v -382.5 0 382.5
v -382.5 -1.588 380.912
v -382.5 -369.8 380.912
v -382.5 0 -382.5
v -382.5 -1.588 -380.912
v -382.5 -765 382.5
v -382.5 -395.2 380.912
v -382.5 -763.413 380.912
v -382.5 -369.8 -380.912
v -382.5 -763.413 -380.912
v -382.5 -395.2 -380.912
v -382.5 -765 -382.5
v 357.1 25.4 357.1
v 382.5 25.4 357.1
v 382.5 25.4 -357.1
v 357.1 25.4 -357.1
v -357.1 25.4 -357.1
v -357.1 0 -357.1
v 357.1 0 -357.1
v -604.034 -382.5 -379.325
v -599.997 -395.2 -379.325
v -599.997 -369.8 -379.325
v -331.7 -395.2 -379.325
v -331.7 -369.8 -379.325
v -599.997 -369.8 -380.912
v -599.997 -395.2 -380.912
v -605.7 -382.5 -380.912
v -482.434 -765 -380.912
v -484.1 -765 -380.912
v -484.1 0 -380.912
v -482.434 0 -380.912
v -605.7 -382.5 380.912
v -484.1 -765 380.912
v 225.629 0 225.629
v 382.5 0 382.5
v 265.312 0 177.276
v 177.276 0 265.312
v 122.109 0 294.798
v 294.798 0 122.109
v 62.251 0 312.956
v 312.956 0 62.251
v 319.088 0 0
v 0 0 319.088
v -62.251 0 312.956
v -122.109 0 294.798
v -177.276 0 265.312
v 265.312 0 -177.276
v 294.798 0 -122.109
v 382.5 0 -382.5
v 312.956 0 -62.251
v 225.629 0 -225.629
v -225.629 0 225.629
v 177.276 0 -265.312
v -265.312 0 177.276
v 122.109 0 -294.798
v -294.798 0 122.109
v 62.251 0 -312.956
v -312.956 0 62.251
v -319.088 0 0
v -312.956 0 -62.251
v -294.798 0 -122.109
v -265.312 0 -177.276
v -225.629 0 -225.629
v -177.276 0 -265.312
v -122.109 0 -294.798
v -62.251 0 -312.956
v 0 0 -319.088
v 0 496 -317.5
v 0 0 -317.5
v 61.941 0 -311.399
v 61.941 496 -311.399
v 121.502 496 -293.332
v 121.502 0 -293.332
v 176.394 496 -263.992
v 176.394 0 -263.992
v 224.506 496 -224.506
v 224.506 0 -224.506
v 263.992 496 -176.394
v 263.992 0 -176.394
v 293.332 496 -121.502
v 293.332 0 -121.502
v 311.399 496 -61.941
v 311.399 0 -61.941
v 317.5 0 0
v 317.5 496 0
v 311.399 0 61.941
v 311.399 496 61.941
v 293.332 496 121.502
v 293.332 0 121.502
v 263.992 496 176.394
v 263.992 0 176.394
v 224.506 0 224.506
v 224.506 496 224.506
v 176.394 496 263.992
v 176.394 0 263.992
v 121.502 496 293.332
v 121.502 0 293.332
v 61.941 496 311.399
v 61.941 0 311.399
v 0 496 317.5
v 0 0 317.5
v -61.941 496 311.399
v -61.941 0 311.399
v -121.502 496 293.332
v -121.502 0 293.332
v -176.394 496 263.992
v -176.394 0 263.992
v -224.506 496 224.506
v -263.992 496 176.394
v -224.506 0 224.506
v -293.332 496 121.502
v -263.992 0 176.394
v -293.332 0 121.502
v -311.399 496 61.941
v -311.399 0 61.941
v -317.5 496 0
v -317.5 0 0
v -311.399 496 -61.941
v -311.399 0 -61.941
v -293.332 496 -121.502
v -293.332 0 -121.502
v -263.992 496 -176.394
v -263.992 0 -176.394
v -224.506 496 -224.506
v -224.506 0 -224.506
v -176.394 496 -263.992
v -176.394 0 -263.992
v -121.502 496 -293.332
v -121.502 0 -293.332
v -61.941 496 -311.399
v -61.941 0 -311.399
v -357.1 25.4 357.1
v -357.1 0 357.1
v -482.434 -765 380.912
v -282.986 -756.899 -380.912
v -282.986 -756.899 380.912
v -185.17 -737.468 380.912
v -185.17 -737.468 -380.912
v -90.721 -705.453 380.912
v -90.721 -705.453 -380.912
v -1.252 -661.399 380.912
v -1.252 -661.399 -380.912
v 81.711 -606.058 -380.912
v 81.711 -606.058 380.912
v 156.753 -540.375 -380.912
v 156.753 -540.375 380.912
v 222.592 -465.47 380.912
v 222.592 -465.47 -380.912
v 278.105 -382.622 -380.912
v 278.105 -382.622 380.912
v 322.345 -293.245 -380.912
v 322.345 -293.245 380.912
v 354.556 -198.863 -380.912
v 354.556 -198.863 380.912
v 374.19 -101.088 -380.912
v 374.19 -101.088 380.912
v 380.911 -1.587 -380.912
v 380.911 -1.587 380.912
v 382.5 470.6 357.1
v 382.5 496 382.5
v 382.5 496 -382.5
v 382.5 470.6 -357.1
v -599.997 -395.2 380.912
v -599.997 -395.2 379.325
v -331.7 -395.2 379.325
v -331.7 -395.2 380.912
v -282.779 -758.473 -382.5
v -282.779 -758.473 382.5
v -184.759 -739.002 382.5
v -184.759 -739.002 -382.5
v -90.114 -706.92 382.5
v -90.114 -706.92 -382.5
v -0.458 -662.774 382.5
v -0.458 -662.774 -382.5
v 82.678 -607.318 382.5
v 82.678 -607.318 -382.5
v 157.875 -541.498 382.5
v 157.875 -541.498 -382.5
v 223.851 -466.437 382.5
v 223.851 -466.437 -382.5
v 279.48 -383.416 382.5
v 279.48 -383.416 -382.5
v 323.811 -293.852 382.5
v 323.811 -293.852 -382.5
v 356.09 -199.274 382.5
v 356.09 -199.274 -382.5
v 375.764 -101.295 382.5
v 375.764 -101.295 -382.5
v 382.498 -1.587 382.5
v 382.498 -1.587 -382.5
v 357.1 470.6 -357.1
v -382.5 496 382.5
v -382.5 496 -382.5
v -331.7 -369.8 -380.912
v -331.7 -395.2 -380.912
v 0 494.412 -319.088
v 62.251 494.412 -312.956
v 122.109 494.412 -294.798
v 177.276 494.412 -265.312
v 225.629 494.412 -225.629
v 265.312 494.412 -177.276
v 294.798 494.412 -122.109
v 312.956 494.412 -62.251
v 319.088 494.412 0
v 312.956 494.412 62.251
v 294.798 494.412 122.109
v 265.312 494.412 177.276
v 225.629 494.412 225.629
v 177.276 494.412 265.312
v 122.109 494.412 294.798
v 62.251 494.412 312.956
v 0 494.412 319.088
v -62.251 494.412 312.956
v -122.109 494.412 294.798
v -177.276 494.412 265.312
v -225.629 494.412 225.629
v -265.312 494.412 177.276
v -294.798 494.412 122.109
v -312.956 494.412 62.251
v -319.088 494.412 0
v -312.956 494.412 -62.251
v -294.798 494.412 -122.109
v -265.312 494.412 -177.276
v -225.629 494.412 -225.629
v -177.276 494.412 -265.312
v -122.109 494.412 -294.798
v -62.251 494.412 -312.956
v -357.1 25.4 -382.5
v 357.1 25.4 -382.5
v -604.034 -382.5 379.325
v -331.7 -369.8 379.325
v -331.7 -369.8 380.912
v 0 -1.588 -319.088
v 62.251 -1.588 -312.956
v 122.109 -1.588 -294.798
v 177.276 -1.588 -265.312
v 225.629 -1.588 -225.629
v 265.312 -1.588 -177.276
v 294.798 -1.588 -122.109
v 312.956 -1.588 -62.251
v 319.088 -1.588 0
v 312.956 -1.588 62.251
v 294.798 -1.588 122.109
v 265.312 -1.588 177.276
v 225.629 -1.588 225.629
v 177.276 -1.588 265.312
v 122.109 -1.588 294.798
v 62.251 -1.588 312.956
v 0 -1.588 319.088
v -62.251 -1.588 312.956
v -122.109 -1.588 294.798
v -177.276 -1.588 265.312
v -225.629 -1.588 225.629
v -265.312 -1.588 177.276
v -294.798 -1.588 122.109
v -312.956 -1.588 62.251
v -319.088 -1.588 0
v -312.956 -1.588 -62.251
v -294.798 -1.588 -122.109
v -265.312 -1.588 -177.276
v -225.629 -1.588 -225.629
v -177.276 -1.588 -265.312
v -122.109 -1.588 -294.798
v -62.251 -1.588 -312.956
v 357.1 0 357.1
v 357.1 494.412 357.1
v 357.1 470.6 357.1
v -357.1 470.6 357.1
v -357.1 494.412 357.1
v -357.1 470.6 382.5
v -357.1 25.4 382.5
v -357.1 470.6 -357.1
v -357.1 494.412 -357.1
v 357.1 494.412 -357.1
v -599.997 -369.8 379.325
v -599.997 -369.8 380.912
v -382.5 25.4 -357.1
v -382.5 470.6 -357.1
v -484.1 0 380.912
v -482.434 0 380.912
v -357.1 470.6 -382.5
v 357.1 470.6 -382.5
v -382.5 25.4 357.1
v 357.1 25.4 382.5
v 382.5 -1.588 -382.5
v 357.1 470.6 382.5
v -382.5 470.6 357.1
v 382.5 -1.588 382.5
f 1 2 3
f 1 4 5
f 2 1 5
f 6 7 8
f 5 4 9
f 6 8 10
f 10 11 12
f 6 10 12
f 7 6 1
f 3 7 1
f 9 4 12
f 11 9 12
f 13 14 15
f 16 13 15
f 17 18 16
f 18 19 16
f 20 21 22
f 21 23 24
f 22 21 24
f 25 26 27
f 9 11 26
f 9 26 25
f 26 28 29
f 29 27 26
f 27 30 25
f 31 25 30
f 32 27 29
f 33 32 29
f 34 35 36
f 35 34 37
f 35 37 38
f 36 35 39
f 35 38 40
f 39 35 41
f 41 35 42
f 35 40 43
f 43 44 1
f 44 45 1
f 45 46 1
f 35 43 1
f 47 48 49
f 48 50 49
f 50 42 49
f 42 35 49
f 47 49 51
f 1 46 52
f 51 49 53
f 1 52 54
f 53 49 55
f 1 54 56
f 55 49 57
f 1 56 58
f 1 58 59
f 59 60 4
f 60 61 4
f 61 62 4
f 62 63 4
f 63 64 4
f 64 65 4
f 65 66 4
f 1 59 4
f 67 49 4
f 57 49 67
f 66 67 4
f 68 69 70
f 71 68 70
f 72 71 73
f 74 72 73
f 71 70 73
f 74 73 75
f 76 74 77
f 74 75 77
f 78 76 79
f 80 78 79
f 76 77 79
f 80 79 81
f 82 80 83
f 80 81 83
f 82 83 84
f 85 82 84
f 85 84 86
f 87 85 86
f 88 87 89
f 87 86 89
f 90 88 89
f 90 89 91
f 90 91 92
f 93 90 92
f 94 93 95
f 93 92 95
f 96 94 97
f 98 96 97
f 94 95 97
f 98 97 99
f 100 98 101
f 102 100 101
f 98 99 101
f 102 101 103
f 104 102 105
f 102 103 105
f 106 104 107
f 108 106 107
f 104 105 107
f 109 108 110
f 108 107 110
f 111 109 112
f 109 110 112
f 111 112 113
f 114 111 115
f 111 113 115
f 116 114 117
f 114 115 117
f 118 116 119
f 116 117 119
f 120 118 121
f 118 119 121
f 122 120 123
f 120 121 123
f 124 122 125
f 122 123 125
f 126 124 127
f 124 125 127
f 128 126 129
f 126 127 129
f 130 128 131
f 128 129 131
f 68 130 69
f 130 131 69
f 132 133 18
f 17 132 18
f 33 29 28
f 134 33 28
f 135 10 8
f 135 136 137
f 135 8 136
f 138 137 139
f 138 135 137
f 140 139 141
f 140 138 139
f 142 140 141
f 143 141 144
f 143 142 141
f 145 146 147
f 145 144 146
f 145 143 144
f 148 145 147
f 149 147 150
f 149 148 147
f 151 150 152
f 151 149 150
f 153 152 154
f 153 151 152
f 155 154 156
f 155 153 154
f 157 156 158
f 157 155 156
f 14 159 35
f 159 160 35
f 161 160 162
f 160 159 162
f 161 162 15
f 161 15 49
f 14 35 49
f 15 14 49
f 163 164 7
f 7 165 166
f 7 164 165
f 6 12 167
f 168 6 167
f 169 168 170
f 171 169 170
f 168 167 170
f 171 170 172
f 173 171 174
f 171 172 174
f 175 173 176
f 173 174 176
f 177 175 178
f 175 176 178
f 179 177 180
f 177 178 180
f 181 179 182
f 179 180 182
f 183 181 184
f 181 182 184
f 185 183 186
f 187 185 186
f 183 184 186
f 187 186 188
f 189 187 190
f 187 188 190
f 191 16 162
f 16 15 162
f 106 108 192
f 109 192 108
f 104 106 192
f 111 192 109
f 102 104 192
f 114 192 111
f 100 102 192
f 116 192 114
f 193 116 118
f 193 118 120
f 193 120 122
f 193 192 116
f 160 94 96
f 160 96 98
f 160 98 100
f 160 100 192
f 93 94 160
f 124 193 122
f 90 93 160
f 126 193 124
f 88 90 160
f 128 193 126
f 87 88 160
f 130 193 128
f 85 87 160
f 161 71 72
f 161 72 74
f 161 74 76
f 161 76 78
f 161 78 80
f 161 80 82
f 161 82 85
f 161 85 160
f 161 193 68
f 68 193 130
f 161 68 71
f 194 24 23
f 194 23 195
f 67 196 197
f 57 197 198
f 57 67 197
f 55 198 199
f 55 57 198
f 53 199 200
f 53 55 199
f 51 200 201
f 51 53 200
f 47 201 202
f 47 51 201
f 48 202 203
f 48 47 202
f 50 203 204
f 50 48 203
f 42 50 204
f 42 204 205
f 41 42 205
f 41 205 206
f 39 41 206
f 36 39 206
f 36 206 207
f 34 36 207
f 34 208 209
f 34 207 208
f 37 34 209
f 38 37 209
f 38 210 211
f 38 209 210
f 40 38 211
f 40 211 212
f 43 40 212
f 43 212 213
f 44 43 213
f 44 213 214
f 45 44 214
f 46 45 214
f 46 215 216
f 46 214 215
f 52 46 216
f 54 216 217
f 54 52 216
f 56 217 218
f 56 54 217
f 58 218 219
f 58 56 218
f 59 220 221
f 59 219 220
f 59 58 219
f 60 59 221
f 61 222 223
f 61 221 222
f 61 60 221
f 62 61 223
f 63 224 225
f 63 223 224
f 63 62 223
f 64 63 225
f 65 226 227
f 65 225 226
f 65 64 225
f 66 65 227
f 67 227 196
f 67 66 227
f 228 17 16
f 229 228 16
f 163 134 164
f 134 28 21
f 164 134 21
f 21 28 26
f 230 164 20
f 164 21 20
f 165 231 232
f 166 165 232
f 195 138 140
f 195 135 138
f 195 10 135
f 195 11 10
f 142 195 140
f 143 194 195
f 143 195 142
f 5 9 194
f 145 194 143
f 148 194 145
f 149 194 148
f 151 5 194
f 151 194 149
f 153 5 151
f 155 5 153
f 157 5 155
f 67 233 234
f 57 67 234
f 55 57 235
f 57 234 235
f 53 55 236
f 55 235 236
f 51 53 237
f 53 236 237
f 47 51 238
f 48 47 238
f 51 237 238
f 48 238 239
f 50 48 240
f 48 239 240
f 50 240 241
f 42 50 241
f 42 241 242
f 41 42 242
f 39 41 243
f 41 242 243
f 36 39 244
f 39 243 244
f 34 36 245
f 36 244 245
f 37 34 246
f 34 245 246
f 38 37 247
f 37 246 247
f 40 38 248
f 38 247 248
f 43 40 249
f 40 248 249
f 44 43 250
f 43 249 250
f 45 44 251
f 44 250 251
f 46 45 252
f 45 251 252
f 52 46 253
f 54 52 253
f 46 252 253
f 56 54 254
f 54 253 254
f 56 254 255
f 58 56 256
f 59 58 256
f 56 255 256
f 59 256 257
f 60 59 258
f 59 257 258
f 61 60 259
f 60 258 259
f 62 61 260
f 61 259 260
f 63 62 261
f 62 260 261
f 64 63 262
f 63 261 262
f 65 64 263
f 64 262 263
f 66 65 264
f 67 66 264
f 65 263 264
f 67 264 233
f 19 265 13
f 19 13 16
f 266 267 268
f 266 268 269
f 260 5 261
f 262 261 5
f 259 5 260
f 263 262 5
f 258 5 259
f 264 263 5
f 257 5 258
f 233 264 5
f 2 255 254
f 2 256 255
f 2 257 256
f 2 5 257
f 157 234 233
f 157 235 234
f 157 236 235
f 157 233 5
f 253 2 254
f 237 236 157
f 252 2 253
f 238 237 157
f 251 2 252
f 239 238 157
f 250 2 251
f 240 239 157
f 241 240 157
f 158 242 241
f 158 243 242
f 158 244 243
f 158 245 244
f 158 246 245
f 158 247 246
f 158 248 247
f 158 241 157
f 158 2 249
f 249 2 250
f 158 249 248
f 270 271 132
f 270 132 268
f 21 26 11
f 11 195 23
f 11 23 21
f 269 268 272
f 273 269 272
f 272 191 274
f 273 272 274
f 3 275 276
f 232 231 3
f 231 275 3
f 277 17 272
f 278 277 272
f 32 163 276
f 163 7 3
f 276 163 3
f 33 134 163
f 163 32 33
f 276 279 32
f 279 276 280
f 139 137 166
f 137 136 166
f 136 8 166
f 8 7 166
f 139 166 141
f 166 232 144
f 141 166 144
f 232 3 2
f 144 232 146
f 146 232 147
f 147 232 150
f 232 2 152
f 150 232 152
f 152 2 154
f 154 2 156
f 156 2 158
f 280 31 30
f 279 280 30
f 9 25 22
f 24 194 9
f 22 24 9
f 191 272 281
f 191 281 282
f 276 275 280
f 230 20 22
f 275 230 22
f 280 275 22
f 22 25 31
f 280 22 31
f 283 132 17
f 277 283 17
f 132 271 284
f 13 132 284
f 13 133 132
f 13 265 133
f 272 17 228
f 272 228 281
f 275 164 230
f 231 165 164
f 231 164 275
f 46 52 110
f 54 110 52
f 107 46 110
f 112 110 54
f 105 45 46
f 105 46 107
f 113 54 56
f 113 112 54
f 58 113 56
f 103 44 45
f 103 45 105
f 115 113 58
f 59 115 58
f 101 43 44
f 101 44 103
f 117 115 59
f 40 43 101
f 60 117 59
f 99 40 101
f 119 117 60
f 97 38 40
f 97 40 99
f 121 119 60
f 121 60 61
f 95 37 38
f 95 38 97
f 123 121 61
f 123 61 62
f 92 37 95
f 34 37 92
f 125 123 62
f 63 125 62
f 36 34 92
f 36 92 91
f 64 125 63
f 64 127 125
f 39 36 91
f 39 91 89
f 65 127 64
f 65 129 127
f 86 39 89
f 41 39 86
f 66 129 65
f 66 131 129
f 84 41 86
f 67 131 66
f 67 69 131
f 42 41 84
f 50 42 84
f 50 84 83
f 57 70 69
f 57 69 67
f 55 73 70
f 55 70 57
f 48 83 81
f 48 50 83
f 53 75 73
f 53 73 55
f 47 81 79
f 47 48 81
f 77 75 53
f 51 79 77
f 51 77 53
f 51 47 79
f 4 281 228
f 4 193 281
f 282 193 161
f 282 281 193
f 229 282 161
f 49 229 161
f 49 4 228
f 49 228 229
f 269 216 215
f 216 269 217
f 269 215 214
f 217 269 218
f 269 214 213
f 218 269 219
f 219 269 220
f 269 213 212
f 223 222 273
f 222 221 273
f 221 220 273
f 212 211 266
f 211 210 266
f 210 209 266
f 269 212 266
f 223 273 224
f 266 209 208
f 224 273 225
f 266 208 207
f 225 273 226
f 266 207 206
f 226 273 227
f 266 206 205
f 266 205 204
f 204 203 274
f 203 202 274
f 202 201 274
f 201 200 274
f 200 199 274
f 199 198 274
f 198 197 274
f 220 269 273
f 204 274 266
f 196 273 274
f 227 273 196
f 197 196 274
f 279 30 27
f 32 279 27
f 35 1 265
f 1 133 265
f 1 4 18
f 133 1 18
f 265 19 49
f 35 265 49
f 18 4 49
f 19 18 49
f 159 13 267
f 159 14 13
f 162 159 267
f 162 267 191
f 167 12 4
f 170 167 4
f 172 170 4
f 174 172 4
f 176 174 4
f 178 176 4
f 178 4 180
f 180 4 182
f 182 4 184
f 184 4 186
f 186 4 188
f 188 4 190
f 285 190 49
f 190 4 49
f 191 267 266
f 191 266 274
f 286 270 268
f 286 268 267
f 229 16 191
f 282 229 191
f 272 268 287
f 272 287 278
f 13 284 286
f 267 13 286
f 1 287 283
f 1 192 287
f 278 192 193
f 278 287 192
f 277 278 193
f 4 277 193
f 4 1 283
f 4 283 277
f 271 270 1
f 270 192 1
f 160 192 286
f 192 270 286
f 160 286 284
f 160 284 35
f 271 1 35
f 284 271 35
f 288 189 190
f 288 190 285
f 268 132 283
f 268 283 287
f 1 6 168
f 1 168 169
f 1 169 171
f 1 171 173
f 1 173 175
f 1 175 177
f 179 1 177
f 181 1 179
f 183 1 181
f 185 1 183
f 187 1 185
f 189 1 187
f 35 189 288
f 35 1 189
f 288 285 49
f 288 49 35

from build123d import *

# Parameters (mm, degrees)
SKETCH1_W           = 765
SKETCH1_H           = 765
SKETCH1_W_2         = 714.2
SKETCH1_H_2         = 714.2
BOSS_EXTRUDE1_DEPTH = 496
SKETCH3_W           = 714.2
SKETCH3_H           = 445.2
CUT_EXTRUDE1_DEPTH  = 989.709891728
SKETCH4_W           = 714.2
SKETCH4_H           = 445.2
CUT_EXTRUDE2_DEPTH  = 989.709891728
SKETCH2_R           = 319.0875
SKETCH2_R_2         = 317.5
BOSS_EXTRUDE2_DEPTH = 496
SKETCH5_W           = 765
SKETCH5_H           = 765
SKETCH5_R           = 319.0875
BOSS_EXTRUDE3_DEPTH = 1.5875
SWEEP1_START        = -382.5
SWEEP1_DEPTH        = 765
SHELL2_T            = -1.5875
BOSS_EXTRUDE4_START = 1.5875
SKETCH11_W          = 765
SKETCH11_H          = 765
SKETCH11_R          = 319.0875
BOSS_EXTRUDE4_DEPTH = 1.5875
BOSS_EXTRUDE5_DEPTH = 254
BOSS_EXTRUDE6_DEPTH = 761.825
BOSS_EXTRUDE7_REACH = 1293.876
SKETCH14_W          = 1.5875
SKETCH14_H          = 25.4


# Read off the part's stored shape, not the designer's step: Sweep1
with BuildPart() as part:
    # Sketch1 → Boss-Extrude1 (new body)
    with BuildSketch(Plane(origin=(0, 0, 0), x_dir=(1, 0, 0), z_dir=(0, 1, 0))):
        Rectangle(SKETCH1_W, SKETCH1_H)
        Rectangle(SKETCH1_W_2, SKETCH1_H_2, mode=Mode.SUBTRACT)
    extrude(amount=BOSS_EXTRUDE1_DEPTH)

    # Sketch3 → Cut-Extrude1 (cut, through all)
    with BuildSketch(Plane(origin=(382.5, 0, 0), x_dir=(0, 0, -1), z_dir=(1, 0, 0))):
        with Locations((0, 248)):
            Rectangle(SKETCH3_W, SKETCH3_H)
    extrude(amount=-CUT_EXTRUDE1_DEPTH, mode=Mode.SUBTRACT)

    # Sketch4 → Cut-Extrude2 (cut, through all)
    with BuildSketch(Plane.XY.offset(382.5)):
        with Locations((0, 248)):
            Rectangle(SKETCH4_W, SKETCH4_H)
    extrude(amount=-CUT_EXTRUDE2_DEPTH, mode=Mode.SUBTRACT)



with BuildPart() as body_2:
    # Sketch2 → Boss-Extrude2 (new body)
    with BuildSketch(Plane.XZ):
        with Locations(Location((0, 0, 0), (0, 0, 270))):
            Circle(SKETCH2_R)
        with Locations(Location((0, 0, 0), (0, 0, 270))):
            Circle(SKETCH2_R_2, mode=Mode.SUBTRACT)
    extrude(amount=-BOSS_EXTRUDE2_DEPTH)


with BuildPart() as part_1:
    add(part.part)

    add(body_2.part)  # Boss-Extrude3 merges body 2
    # Sketch5 → Boss-Extrude3 (add)
    with BuildSketch(Plane(origin=(0, 496, 0), x_dir=(1, 0, 0), z_dir=(0, 1, 0))):
        Rectangle(SKETCH5_W, SKETCH5_H)
        with Locations(Location((0, 0, 0), (0, 0, 90))):
            Circle(SKETCH5_R, mode=Mode.SUBTRACT)
    extrude(amount=-BOSS_EXTRUDE3_DEPTH)


with BuildPart() as body_2_2:
    # Sweep1 outline → Sweep1 (new body)
    with BuildSketch(Plane.XY.offset(SWEEP1_START)):
        with BuildLine():
            ThreePointArc((-382.5, -765), (158.436687608, -540.936687608), (382.5, 0))
            Line((382.5, 0), (-382.5, 0))
            Line((-382.5, 0), (-382.5, -765))
        make_face()
    extrude(amount=SWEEP1_DEPTH)

    # Shell2
    shell2_openings = [body_2_2.faces().sort_by_distance(p)[0] for p in [
        (-382.5, -382.5, 0),
        (0, 0, 0),
    ]]
    offset(amount=SHELL2_T, openings=shell2_openings, kind=Kind.INTERSECTION)

    # Sketch11 → Boss-Extrude4 (add)
    with BuildSketch(Plane.XZ.offset(BOSS_EXTRUDE4_START)):
        Rectangle(SKETCH11_W, SKETCH11_H)
        with Locations(Location((0, 0, 0), (0, 0, 270))):
            Circle(SKETCH11_R, mode=Mode.SUBTRACT)
    extrude(amount=-BOSS_EXTRUDE4_DEPTH)

    # Sketch12 → Boss-Extrude5 (add)
    with BuildSketch(Plane.ZY.offset(331.7)):
        Polygon((-380.9125, -382.5), (-380.9125, -369.8), (-379.325, -369.8), (-379.325, -395.2), (-380.9125, -395.2), align=None)
        Polygon((380.9125, -369.8), (379.325, -369.8), (379.325, -395.2), (380.9125, -395.2), (380.9125, -382.5), align=None)
    extrude(amount=BOSS_EXTRUDE5_DEPTH)


with BuildPart() as body_3:
    # Sketch13 → Boss-Extrude6 (new body)
    with BuildSketch(Plane(origin=(0, 0, -380.9125), x_dir=(-1, 0, 0), z_dir=(0, 0, -1))):
        Polygon((605.7, -382.5), (484.1, -765), (482.43420953, -765), (604.03420953, -382.5), (482.43420953, 0), (484.1, 0), align=None)
    extrude(amount=-BOSS_EXTRUDE6_DEPTH)

    # Sketch14 → Boss-Extrude7 (add, up to next)
    with BuildSketch(Plane.ZY.offset(585.7), mode=Mode.PRIVATE) as boss_extrude7_sk1:
        with Locations((380.11875, -382.5)):
            Rectangle(SKETCH14_W, SKETCH14_H)
    boss_extrude7_tool1 = extrude(boss_extrude7_sk1.sketch, amount=BOSS_EXTRUDE7_REACH, mode=Mode.PRIVATE) - body_3.part
    # Sketch14 → Boss-Extrude7 (add, up to next)
    with BuildSketch(Plane.ZY.offset(585.7), mode=Mode.PRIVATE) as boss_extrude7_sk2:
        with Locations((-380.11875, -382.5)):
            Rectangle(SKETCH14_W, SKETCH14_H)
    boss_extrude7_tool2 = extrude(boss_extrude7_sk2.sketch, amount=BOSS_EXTRUDE7_REACH, mode=Mode.PRIVATE) - body_3.part

    add(body_2_2.part)  # Boss-Extrude7 merges body 2 2
    add(boss_extrude7_tool1.solids().sort_by_distance((-585.7, -382.5, 380.11875))[0])
    add(boss_extrude7_tool2.solids().sort_by_distance((-585.7, -382.5, -380.11875))[0])


solid = Compound([part_1.part, body_3.part])
